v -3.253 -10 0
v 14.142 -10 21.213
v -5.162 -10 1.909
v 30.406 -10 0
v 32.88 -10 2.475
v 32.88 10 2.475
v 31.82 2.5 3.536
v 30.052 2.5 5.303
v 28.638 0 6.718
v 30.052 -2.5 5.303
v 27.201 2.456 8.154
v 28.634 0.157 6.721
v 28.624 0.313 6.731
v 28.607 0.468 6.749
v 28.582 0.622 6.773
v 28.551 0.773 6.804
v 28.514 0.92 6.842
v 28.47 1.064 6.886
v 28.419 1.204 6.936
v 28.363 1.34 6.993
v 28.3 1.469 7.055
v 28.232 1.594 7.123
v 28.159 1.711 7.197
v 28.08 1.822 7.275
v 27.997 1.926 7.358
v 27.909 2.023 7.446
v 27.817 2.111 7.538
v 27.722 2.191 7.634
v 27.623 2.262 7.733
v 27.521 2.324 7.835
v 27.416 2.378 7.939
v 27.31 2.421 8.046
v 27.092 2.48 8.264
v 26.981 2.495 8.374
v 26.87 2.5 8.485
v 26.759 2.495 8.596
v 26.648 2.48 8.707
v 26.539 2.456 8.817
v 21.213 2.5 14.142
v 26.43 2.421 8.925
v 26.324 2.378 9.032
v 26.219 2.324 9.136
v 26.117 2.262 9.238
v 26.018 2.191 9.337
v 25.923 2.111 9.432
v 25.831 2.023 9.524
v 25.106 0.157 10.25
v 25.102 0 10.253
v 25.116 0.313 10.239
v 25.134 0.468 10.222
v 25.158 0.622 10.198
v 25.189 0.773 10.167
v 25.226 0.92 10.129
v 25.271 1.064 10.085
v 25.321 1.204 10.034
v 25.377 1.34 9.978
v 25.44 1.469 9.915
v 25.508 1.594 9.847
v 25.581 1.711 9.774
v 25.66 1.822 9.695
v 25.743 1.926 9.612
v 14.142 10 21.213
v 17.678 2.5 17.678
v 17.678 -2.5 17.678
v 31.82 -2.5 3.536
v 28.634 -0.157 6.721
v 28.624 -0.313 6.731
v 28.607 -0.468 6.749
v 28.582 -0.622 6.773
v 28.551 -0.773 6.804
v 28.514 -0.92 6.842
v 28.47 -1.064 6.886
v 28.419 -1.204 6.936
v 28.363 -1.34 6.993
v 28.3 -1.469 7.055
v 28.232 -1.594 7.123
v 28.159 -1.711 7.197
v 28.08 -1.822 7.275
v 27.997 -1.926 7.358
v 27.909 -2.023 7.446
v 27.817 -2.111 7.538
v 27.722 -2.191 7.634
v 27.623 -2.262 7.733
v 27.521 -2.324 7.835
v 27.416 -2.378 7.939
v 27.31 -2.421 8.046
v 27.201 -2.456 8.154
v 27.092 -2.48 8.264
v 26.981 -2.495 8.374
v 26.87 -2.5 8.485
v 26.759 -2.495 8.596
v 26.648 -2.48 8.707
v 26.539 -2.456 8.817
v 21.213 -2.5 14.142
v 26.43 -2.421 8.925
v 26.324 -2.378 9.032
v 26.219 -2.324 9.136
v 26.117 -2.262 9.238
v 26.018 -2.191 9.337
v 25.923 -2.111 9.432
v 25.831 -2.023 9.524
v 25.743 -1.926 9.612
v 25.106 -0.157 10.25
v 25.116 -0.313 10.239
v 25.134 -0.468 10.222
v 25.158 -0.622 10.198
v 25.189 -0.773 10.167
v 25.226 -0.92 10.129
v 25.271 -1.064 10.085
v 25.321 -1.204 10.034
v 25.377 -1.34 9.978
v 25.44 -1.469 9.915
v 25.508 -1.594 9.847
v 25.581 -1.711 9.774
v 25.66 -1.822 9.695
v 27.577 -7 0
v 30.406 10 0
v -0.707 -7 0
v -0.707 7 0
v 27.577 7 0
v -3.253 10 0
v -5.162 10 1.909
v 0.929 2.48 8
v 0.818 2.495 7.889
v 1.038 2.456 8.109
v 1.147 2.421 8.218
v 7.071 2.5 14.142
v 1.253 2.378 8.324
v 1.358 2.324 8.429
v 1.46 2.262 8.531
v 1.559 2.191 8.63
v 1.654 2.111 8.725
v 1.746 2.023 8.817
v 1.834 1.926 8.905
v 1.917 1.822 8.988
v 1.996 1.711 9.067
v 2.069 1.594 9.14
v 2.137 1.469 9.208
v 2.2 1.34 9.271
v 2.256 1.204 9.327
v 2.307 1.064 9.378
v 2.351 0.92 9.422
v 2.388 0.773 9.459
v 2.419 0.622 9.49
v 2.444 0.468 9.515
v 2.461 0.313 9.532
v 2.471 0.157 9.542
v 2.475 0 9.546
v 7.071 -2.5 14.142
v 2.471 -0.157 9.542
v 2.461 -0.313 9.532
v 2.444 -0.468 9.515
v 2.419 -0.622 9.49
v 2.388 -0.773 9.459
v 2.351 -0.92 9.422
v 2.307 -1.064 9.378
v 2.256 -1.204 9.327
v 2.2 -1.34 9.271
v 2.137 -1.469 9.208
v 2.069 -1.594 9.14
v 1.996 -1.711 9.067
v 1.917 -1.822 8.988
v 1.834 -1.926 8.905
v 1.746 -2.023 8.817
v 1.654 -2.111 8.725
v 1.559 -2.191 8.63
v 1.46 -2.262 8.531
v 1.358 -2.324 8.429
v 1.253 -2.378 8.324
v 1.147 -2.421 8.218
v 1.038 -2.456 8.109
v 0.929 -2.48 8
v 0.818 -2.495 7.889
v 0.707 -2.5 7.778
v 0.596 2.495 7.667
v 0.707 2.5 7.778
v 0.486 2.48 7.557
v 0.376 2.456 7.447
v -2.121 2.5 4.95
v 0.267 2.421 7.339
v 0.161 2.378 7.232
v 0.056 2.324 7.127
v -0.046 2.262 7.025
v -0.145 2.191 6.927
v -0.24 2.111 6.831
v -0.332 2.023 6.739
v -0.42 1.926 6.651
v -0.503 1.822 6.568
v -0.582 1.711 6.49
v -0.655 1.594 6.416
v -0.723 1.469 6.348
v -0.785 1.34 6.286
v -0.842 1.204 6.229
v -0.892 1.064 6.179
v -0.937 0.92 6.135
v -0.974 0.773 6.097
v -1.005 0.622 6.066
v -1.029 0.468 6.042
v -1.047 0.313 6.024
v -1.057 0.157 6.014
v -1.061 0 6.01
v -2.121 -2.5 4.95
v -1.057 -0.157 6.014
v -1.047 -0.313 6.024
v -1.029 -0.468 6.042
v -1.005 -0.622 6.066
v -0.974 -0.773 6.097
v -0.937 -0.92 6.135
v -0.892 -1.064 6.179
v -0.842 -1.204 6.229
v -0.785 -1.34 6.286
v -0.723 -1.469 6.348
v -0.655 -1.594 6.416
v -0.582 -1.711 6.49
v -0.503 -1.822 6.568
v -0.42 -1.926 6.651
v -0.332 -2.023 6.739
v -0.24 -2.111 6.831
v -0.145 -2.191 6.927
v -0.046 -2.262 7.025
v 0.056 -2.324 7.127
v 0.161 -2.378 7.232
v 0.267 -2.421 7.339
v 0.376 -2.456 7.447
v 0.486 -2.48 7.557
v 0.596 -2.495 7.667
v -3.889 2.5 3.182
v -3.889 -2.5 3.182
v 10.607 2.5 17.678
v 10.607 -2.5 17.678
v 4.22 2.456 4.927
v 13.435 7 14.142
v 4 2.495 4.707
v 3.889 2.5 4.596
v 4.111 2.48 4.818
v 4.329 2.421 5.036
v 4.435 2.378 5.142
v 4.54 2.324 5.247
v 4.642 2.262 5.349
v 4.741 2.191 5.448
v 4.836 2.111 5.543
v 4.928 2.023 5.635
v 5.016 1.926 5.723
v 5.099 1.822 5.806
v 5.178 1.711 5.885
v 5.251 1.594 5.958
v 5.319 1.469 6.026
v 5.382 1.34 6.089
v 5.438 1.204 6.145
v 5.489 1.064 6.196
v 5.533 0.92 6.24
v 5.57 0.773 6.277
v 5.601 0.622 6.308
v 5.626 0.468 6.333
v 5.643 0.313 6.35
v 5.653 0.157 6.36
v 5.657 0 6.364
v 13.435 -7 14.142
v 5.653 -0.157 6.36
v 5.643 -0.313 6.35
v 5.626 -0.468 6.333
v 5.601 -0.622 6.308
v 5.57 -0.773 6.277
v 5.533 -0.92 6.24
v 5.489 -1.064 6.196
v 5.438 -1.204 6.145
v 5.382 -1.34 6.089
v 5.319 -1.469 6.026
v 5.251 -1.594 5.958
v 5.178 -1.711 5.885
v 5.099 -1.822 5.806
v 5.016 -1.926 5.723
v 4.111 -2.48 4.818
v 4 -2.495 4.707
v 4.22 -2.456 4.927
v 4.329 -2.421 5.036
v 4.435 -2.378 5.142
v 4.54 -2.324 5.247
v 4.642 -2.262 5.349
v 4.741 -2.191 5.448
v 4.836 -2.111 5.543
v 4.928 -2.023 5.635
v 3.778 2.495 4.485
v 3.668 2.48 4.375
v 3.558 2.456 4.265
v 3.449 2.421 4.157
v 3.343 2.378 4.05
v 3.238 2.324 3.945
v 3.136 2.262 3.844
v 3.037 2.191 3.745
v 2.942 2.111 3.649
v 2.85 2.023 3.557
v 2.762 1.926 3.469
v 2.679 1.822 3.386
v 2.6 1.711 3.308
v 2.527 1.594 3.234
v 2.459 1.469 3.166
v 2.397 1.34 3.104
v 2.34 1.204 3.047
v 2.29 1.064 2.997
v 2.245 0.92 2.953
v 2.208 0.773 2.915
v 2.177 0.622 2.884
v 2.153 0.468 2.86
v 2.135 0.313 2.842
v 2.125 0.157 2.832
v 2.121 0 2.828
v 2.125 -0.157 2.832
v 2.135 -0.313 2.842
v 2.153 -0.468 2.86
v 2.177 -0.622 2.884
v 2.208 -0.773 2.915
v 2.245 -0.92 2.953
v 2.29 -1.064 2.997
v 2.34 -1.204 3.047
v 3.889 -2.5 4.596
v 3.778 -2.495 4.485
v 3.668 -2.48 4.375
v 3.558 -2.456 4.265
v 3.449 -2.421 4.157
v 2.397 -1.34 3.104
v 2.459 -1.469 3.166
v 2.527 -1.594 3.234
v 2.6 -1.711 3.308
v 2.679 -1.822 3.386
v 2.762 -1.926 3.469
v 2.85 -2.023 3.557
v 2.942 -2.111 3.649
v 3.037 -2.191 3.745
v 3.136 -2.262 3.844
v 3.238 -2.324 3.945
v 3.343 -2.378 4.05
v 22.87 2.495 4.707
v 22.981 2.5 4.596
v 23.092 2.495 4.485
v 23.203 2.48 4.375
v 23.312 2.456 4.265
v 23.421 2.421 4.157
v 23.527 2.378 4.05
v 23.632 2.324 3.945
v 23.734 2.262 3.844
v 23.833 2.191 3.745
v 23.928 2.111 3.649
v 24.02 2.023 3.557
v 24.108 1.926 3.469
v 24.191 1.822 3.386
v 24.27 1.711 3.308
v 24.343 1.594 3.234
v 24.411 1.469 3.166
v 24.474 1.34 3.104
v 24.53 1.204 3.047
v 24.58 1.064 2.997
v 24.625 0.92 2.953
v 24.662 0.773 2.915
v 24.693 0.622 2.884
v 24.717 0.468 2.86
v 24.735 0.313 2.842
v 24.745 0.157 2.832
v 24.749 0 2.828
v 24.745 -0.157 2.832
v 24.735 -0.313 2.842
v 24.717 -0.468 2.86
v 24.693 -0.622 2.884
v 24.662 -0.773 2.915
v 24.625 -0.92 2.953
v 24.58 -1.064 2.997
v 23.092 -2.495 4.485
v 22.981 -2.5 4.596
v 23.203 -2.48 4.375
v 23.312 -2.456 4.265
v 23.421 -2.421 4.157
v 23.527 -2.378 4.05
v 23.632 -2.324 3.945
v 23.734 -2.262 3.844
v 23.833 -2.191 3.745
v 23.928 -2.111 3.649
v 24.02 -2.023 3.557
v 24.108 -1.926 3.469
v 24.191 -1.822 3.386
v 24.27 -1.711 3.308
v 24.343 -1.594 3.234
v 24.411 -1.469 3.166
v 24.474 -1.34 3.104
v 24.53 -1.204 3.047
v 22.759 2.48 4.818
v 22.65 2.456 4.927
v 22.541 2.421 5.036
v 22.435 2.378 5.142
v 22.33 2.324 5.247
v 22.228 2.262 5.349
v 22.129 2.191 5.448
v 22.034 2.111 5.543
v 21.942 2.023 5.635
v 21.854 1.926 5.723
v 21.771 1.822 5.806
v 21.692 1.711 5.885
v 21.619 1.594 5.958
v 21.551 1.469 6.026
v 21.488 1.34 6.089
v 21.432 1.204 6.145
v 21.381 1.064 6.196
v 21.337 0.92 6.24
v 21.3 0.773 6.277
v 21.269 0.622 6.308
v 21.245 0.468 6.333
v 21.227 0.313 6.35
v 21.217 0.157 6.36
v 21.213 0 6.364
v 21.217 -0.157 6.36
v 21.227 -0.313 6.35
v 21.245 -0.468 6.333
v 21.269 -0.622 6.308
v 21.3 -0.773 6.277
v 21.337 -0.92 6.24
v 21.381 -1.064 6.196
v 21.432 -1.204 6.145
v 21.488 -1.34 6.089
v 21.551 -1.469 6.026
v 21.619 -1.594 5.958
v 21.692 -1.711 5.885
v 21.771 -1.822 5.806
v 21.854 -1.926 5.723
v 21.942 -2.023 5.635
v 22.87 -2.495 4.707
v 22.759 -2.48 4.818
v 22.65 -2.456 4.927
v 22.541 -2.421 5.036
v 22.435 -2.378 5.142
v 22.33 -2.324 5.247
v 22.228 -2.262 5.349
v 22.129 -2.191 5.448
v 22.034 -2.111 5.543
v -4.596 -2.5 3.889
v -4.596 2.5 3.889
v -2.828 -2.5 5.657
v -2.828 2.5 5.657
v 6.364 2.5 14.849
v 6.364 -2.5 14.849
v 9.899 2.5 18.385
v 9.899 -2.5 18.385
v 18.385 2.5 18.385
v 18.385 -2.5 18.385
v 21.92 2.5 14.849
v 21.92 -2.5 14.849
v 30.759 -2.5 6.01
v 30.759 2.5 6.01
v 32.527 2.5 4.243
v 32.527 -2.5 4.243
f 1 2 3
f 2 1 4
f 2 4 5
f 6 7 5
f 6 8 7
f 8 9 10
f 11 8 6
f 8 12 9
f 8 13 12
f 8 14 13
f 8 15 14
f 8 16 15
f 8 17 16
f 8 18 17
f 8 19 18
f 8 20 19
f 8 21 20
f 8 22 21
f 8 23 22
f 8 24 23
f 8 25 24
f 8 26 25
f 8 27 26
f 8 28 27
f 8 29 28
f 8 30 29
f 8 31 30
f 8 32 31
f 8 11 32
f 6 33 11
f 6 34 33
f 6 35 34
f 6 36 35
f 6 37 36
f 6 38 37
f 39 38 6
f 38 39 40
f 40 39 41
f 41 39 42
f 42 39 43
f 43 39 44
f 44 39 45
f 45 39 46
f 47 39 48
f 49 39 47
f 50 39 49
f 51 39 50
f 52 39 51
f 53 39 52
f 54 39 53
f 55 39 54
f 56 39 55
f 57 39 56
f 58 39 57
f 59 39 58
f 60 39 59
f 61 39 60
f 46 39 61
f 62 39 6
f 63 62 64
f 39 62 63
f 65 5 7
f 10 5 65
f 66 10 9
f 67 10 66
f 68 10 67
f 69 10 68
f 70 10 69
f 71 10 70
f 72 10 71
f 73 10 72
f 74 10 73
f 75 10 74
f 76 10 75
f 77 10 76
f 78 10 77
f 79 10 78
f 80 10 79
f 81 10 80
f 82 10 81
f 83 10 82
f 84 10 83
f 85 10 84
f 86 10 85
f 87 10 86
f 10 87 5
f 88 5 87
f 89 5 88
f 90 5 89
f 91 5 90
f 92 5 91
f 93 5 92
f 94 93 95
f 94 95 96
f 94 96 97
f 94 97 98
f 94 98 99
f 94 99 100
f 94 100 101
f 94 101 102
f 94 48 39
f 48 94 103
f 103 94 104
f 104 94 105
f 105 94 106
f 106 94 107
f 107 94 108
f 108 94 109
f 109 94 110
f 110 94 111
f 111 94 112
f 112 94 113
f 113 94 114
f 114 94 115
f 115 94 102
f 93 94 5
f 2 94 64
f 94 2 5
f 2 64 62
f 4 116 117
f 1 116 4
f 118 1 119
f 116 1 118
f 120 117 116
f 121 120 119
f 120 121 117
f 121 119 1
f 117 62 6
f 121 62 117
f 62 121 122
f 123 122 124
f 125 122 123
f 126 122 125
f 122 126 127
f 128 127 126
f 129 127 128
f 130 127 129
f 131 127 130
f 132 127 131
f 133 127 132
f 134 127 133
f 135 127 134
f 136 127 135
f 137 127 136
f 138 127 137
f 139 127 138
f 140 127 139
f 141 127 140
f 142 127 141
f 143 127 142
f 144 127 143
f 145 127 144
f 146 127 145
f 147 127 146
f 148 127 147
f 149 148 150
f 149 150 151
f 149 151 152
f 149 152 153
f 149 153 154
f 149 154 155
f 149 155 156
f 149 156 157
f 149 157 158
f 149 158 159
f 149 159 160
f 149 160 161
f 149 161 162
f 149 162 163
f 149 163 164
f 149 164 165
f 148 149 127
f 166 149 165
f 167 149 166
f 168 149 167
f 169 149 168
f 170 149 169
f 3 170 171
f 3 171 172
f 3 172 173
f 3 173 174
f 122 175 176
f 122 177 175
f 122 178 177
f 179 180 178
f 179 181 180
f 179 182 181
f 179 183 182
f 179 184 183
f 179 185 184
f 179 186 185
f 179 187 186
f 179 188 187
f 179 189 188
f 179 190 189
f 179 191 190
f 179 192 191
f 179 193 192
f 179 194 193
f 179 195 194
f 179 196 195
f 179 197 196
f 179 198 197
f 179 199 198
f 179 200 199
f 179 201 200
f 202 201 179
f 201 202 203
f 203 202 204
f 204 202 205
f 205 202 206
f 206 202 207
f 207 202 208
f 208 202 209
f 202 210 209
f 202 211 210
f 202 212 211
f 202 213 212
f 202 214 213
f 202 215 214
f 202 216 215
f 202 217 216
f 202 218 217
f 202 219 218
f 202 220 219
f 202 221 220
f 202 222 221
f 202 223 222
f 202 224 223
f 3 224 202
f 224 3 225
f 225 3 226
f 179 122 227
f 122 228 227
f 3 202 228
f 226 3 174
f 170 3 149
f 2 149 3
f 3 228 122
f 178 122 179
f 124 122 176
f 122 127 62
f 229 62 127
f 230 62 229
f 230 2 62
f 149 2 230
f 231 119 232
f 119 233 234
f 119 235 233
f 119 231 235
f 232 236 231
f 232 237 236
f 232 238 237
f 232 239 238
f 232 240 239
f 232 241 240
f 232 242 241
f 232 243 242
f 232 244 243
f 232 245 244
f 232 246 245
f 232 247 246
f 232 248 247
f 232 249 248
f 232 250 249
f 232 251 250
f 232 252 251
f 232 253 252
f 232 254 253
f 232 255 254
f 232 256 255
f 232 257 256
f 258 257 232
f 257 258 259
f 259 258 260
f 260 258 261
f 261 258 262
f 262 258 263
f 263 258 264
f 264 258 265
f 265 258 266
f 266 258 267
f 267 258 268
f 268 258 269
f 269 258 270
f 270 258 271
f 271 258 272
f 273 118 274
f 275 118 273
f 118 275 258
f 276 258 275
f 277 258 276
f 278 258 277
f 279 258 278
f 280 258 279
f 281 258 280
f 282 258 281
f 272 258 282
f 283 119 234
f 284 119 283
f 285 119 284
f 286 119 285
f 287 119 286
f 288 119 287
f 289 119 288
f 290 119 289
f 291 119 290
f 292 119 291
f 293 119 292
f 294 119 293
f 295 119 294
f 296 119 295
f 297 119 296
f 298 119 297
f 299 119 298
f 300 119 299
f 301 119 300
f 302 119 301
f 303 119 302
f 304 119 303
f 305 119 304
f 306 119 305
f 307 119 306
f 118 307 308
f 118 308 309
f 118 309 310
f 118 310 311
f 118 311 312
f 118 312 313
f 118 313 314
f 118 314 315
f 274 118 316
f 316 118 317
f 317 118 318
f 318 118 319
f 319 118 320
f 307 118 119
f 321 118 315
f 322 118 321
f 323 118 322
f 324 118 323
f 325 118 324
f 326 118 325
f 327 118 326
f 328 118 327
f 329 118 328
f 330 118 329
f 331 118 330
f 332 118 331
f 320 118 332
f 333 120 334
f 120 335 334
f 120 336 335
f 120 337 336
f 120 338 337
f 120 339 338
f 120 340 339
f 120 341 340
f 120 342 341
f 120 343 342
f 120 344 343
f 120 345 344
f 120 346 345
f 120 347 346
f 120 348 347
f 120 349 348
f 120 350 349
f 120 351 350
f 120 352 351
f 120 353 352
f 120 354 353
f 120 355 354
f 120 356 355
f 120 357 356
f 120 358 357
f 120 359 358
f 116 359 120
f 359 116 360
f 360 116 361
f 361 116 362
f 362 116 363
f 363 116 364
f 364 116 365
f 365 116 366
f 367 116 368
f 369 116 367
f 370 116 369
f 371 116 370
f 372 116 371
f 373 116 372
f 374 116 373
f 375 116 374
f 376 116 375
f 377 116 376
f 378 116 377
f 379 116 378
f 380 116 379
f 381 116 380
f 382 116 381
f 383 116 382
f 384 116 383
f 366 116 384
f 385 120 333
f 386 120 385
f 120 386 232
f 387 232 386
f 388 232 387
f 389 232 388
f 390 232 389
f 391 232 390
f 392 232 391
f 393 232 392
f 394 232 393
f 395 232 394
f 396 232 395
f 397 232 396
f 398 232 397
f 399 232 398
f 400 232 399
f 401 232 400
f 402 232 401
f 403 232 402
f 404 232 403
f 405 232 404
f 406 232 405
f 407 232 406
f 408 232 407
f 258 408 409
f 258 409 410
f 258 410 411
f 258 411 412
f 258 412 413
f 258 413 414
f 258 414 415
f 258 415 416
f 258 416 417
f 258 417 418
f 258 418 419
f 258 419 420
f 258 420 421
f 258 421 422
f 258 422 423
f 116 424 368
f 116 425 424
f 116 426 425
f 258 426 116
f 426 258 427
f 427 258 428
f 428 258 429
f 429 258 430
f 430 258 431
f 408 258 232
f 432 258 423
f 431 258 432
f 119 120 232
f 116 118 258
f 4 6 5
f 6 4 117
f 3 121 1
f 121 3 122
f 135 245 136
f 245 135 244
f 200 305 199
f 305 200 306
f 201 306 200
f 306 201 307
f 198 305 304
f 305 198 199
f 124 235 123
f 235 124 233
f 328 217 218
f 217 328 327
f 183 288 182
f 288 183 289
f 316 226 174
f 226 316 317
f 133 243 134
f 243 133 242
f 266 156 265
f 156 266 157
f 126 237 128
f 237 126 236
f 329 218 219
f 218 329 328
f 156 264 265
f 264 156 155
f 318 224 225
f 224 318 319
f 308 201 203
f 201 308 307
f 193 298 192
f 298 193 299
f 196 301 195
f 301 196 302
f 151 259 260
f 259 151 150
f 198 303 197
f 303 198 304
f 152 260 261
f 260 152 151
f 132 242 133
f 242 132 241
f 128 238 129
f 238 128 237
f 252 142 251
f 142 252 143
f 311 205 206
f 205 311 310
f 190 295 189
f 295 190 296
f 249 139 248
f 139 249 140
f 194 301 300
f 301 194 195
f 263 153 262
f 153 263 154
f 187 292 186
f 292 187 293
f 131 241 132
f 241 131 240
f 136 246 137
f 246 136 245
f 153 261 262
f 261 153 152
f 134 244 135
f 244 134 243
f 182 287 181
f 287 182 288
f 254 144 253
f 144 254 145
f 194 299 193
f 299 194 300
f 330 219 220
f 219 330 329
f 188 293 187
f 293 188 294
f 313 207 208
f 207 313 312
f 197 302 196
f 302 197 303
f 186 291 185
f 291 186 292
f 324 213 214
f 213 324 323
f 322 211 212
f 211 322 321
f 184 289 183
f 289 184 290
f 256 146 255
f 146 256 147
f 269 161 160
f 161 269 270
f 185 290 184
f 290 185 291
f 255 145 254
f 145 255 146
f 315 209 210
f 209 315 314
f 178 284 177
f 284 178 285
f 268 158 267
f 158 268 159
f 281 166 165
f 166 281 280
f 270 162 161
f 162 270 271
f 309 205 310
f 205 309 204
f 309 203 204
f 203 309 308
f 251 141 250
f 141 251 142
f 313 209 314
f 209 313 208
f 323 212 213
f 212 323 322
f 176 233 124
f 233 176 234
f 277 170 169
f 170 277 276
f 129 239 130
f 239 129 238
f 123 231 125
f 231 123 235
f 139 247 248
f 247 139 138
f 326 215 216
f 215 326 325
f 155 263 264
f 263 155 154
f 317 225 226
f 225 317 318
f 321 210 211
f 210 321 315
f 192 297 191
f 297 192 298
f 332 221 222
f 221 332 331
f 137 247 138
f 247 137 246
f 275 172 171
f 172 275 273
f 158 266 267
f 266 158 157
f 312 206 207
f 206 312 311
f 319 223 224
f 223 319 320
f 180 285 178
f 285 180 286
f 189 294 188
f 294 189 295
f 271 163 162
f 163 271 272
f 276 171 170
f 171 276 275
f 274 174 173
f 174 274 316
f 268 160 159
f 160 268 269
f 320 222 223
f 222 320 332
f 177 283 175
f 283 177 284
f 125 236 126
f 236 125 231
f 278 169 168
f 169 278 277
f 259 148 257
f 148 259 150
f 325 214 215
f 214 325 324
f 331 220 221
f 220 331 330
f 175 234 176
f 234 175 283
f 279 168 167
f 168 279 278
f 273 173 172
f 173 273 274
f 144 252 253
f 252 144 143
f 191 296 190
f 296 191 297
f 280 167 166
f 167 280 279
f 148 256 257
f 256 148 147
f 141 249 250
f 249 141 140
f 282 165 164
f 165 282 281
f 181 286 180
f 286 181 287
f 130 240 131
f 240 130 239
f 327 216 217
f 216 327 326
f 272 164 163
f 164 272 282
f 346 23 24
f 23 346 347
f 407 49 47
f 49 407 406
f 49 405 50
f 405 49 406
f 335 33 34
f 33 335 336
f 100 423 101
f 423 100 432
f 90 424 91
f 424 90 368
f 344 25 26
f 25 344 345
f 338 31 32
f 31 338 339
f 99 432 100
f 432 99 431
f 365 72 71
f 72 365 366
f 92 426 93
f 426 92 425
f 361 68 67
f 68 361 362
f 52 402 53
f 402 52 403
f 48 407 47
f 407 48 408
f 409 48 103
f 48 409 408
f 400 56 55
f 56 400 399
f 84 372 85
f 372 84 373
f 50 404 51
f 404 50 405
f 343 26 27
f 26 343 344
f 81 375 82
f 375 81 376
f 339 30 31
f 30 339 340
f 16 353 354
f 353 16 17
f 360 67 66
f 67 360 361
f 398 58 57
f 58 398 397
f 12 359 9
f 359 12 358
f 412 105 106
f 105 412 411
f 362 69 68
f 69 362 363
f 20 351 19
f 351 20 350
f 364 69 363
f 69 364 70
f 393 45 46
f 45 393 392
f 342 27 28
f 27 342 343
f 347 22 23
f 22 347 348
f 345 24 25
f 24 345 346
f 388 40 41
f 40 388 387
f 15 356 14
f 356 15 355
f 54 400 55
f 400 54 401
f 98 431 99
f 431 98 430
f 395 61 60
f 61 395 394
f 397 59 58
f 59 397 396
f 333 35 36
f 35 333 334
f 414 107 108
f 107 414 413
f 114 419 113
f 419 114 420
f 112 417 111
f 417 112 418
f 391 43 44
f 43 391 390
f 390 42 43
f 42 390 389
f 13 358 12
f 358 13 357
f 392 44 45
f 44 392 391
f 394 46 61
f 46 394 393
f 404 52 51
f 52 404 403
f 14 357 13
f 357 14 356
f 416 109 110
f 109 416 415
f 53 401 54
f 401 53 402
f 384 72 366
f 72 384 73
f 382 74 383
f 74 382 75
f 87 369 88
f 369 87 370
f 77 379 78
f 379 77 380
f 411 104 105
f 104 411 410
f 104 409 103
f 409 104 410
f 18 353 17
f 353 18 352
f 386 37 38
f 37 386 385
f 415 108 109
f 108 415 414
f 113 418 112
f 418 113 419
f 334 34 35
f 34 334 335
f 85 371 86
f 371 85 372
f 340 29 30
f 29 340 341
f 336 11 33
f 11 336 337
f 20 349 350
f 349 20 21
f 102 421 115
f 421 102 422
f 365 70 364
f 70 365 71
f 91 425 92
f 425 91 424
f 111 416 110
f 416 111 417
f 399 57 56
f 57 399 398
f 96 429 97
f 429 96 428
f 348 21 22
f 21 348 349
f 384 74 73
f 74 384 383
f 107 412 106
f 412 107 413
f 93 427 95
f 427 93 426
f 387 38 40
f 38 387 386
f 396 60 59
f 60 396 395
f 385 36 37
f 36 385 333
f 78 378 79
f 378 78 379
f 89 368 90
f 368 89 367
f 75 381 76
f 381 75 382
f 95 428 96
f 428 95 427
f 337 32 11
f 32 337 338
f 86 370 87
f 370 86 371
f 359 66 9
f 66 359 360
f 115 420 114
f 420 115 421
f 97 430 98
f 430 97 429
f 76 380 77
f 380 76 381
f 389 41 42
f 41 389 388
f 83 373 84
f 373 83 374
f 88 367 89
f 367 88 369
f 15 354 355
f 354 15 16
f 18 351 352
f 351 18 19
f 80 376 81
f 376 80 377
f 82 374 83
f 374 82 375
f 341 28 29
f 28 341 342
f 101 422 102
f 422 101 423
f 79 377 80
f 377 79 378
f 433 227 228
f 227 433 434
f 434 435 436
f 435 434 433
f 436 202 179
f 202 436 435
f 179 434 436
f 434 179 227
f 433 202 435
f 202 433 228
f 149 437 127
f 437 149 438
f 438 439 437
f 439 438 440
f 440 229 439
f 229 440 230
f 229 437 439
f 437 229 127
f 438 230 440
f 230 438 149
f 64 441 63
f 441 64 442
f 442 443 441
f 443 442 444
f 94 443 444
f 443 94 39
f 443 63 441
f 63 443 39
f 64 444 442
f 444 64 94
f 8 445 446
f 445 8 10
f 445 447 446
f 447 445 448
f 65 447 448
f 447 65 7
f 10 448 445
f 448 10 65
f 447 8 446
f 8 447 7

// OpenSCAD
/*
Door stopper

Author:
- Daniel K. Schneider, TECFA, University of Geneva, April 2010

Copyright and credits:
- Attribution - Non-Commercial - Share Alike license.
  (http://creativecommons.org/licenses/by-nc-sa/3.0/)

Purpose:
- Stops doors from banging when it is windy :)
- Offer it as a 3D visiting card, publicity for programs, etc.

Usage:
- Add some text on top of the flat area. E.g. use Netfabb to create and to position the 3D letters, then merge with Meshlab (or buy Netfabb Pro).
- Add text underneath, or use the door_stopper_simple () module. Text underneath should stretch in both the x/y directions and have z=0 ! Else you will have too much overhang.
- I recommend using a fat, round font like Arial Rounded MT Bold
- For some kinds of buildings, you may have to adapt the OpenScad code, i.e. you can make it flatter or higher. e.g. for indoor use, a much flatter version also can do in most houses.
- Of course, you could make it shorter and narrower, but this will seriously limit printing readable text. If you make it much smaller, consider printing slowly with fine filament and reduced layer thickness.

Default values to use for text size and positioning
- Text height underneath = 3mm ; Z position = 0
- Text height on top = between 2 and 4 mm ; Z position = 7.5

Printing with the RapMan / skeinforge
- Printing is *much* easier with PLA since it doesn't warp, but PLA is not as solid as ABS.
- ABS will probably warp, so:
-- take the print bed off and sand it again
-- make a really sticky and large raft (3mm thickness and 15 mm extra margin) and print it slowly !
-- even then, be prepared to file away the rounded bottom or if it warps just be bit, accept that it will be rounded since that hasn't much impact on door stopping ;)
-- use a fan maybe, but then raise all temperatures by 5 or more (depending on how much your ventilator will cool), e.g. 243 for the raft and 256 for the rest.
- Use a good infill if you want it solid, e.g. 25 %
- Flow rate: about 450 for a 4mm layer thickness and 16 head speed.

*/ 


// ------------------------- Pick your module
// Comment/uncomment one

door_stopper ();
// door_stopper_simple ();

// -------------------------- door stopper with text underneath 

module door_stopper ()
{
    height = 30  ;
    length = 30 ;
    width= 20 ;
    half_width  = width / 2;
    
    borders = 3; // 3 mm on each side

    // params for bottom inset
    bottom_cube_length = length -4 * borders;
    bottom_cube_width = width - 2 * borders;
    bottom_cube_height = 0.0 ;
    bottom_z = 0;

    // params for top inset
    top_cube_length = length +2 * borders;
    top_cube_width  = width - 2 * borders;
    top_cube_height = height ;  // make it big enough // 25
    top_z = height/2 + 3 ;// 12.5 + 7.5 = 10 ; 10 - 2.5 = 7.5

    // param for tip
    tip_cut_pos = length/2 + 7;

    // param for top tip
    top_tip_pos = height + 7; 

  rotate(135,[0,1,0]){
	translate([0,0,-5]){

	translate ([-2,-2.5,-1]){
		cube ([2.5,5,1]);
	}
	translate ([-20,-2.5,-1]){
		cube ([5,5,1]);
	}
	translate ([-26,-2.5,10]){
		rotate(90,[0,1,0]){
			cube ([5,5,1]);
		}
	}
	translate ([-26,-2.5,25]){
		rotate(90,[0,1,0]){
			cube ([2.5,5,1]);
		}
	}


    difference() {
	translate ([-length/1.2, 0, 0]) {
    	    polyhedron (	
	    		points = [[0, -half_width, height], [0, half_width, height], [0, half_width, 0], [0, -half_width, 0], [length, -half_width, 0], [length, half_width, 0]],
			triangles = [[0,3,2], [0,2,1], [3,0,4], [1,2,5], [0,5,4], [0,1,5],  [5,2,4], [4,2,3], ]);
	}
	// bottom inset
	translate ([-1 * borders, 0, bottom_z]) {
	    # cube ([bottom_cube_length,
		     bottom_cube_width,
		     bottom_cube_height],
		    center=true) ;
	}
	// top inset
	translate ([-1 * borders+1.5, 0, top_z+1.5]) {
	    # cube ([top_cube_length,
		     top_cube_width,
		     top_cube_height],
		    center=true) ;
	}
	// cut of the top tip a bit
	translate ([-1 *length/2,0, top_tip_pos-3]) {
	    # cube ([length,
		     width+2,
		     height / 2],
		    center=true) ;
	}
	// cut of the front tip a bit
	translate ([tip_cut_pos-9.7, 0, 0]) {
	    # cube ([20,
		   width + 1,
		   height],
		  center=true) ;
	}
	translate([-6,0,0]){
		cylinder (h = 10, r=2.5, center = true, $fn=100);
	}
	translate([0,0,18]){
		rotate ([0,90,0]) 	{
			cylinder (h = 60, r=2.5, center = true, $fn=100);
		}
          }
	
    }
    }
}
}


// -------------------------- door stopper without text underneath 

module door_stopper_simple ()
{
    height = 20  ;
    length = 125 ;
    width= 40 ;
    half_width  = width / 2;
    
    borders = 10; // 1 cm on each side

    top_cube_length = length - 4 * borders;
    top_cube_width  = width - 2 * borders;
    top_cube_height = height ;  // make it big enough
    top_z = height/2 + 4 ; // adjust manually ;)

    tip_cut_pos = length/2 - 0.5;

    difference() {
	translate ([-length/2.0, 0, 0]) {
    	    polyhedron (	
	    		points = [[0, -half_width, height], [0, half_width, height], [0, half_width, 0], [0, -half_width, 0], [length, -half_width, 0], [length, half_width, 0]],
			triangles = [[0,3,2], [0,2,1], [3,0,4], [1,2,5], [0,5,4], [0,1,5],  [5,2,4], [4,2,3], ]);
	}

	// top inset
	translate ([-1 * borders, 0, top_z]) {
	    # cube ([top_cube_length,
		     top_cube_width,
		     top_cube_height],
		    center=true) ;
	}
	// cut of the tip a bit

	translate ([tip_cut_pos, 0, 0]) {
	    # cube ([20,
		     width + 1,
		     height],
		    center=true) ;
	}
    }
}
